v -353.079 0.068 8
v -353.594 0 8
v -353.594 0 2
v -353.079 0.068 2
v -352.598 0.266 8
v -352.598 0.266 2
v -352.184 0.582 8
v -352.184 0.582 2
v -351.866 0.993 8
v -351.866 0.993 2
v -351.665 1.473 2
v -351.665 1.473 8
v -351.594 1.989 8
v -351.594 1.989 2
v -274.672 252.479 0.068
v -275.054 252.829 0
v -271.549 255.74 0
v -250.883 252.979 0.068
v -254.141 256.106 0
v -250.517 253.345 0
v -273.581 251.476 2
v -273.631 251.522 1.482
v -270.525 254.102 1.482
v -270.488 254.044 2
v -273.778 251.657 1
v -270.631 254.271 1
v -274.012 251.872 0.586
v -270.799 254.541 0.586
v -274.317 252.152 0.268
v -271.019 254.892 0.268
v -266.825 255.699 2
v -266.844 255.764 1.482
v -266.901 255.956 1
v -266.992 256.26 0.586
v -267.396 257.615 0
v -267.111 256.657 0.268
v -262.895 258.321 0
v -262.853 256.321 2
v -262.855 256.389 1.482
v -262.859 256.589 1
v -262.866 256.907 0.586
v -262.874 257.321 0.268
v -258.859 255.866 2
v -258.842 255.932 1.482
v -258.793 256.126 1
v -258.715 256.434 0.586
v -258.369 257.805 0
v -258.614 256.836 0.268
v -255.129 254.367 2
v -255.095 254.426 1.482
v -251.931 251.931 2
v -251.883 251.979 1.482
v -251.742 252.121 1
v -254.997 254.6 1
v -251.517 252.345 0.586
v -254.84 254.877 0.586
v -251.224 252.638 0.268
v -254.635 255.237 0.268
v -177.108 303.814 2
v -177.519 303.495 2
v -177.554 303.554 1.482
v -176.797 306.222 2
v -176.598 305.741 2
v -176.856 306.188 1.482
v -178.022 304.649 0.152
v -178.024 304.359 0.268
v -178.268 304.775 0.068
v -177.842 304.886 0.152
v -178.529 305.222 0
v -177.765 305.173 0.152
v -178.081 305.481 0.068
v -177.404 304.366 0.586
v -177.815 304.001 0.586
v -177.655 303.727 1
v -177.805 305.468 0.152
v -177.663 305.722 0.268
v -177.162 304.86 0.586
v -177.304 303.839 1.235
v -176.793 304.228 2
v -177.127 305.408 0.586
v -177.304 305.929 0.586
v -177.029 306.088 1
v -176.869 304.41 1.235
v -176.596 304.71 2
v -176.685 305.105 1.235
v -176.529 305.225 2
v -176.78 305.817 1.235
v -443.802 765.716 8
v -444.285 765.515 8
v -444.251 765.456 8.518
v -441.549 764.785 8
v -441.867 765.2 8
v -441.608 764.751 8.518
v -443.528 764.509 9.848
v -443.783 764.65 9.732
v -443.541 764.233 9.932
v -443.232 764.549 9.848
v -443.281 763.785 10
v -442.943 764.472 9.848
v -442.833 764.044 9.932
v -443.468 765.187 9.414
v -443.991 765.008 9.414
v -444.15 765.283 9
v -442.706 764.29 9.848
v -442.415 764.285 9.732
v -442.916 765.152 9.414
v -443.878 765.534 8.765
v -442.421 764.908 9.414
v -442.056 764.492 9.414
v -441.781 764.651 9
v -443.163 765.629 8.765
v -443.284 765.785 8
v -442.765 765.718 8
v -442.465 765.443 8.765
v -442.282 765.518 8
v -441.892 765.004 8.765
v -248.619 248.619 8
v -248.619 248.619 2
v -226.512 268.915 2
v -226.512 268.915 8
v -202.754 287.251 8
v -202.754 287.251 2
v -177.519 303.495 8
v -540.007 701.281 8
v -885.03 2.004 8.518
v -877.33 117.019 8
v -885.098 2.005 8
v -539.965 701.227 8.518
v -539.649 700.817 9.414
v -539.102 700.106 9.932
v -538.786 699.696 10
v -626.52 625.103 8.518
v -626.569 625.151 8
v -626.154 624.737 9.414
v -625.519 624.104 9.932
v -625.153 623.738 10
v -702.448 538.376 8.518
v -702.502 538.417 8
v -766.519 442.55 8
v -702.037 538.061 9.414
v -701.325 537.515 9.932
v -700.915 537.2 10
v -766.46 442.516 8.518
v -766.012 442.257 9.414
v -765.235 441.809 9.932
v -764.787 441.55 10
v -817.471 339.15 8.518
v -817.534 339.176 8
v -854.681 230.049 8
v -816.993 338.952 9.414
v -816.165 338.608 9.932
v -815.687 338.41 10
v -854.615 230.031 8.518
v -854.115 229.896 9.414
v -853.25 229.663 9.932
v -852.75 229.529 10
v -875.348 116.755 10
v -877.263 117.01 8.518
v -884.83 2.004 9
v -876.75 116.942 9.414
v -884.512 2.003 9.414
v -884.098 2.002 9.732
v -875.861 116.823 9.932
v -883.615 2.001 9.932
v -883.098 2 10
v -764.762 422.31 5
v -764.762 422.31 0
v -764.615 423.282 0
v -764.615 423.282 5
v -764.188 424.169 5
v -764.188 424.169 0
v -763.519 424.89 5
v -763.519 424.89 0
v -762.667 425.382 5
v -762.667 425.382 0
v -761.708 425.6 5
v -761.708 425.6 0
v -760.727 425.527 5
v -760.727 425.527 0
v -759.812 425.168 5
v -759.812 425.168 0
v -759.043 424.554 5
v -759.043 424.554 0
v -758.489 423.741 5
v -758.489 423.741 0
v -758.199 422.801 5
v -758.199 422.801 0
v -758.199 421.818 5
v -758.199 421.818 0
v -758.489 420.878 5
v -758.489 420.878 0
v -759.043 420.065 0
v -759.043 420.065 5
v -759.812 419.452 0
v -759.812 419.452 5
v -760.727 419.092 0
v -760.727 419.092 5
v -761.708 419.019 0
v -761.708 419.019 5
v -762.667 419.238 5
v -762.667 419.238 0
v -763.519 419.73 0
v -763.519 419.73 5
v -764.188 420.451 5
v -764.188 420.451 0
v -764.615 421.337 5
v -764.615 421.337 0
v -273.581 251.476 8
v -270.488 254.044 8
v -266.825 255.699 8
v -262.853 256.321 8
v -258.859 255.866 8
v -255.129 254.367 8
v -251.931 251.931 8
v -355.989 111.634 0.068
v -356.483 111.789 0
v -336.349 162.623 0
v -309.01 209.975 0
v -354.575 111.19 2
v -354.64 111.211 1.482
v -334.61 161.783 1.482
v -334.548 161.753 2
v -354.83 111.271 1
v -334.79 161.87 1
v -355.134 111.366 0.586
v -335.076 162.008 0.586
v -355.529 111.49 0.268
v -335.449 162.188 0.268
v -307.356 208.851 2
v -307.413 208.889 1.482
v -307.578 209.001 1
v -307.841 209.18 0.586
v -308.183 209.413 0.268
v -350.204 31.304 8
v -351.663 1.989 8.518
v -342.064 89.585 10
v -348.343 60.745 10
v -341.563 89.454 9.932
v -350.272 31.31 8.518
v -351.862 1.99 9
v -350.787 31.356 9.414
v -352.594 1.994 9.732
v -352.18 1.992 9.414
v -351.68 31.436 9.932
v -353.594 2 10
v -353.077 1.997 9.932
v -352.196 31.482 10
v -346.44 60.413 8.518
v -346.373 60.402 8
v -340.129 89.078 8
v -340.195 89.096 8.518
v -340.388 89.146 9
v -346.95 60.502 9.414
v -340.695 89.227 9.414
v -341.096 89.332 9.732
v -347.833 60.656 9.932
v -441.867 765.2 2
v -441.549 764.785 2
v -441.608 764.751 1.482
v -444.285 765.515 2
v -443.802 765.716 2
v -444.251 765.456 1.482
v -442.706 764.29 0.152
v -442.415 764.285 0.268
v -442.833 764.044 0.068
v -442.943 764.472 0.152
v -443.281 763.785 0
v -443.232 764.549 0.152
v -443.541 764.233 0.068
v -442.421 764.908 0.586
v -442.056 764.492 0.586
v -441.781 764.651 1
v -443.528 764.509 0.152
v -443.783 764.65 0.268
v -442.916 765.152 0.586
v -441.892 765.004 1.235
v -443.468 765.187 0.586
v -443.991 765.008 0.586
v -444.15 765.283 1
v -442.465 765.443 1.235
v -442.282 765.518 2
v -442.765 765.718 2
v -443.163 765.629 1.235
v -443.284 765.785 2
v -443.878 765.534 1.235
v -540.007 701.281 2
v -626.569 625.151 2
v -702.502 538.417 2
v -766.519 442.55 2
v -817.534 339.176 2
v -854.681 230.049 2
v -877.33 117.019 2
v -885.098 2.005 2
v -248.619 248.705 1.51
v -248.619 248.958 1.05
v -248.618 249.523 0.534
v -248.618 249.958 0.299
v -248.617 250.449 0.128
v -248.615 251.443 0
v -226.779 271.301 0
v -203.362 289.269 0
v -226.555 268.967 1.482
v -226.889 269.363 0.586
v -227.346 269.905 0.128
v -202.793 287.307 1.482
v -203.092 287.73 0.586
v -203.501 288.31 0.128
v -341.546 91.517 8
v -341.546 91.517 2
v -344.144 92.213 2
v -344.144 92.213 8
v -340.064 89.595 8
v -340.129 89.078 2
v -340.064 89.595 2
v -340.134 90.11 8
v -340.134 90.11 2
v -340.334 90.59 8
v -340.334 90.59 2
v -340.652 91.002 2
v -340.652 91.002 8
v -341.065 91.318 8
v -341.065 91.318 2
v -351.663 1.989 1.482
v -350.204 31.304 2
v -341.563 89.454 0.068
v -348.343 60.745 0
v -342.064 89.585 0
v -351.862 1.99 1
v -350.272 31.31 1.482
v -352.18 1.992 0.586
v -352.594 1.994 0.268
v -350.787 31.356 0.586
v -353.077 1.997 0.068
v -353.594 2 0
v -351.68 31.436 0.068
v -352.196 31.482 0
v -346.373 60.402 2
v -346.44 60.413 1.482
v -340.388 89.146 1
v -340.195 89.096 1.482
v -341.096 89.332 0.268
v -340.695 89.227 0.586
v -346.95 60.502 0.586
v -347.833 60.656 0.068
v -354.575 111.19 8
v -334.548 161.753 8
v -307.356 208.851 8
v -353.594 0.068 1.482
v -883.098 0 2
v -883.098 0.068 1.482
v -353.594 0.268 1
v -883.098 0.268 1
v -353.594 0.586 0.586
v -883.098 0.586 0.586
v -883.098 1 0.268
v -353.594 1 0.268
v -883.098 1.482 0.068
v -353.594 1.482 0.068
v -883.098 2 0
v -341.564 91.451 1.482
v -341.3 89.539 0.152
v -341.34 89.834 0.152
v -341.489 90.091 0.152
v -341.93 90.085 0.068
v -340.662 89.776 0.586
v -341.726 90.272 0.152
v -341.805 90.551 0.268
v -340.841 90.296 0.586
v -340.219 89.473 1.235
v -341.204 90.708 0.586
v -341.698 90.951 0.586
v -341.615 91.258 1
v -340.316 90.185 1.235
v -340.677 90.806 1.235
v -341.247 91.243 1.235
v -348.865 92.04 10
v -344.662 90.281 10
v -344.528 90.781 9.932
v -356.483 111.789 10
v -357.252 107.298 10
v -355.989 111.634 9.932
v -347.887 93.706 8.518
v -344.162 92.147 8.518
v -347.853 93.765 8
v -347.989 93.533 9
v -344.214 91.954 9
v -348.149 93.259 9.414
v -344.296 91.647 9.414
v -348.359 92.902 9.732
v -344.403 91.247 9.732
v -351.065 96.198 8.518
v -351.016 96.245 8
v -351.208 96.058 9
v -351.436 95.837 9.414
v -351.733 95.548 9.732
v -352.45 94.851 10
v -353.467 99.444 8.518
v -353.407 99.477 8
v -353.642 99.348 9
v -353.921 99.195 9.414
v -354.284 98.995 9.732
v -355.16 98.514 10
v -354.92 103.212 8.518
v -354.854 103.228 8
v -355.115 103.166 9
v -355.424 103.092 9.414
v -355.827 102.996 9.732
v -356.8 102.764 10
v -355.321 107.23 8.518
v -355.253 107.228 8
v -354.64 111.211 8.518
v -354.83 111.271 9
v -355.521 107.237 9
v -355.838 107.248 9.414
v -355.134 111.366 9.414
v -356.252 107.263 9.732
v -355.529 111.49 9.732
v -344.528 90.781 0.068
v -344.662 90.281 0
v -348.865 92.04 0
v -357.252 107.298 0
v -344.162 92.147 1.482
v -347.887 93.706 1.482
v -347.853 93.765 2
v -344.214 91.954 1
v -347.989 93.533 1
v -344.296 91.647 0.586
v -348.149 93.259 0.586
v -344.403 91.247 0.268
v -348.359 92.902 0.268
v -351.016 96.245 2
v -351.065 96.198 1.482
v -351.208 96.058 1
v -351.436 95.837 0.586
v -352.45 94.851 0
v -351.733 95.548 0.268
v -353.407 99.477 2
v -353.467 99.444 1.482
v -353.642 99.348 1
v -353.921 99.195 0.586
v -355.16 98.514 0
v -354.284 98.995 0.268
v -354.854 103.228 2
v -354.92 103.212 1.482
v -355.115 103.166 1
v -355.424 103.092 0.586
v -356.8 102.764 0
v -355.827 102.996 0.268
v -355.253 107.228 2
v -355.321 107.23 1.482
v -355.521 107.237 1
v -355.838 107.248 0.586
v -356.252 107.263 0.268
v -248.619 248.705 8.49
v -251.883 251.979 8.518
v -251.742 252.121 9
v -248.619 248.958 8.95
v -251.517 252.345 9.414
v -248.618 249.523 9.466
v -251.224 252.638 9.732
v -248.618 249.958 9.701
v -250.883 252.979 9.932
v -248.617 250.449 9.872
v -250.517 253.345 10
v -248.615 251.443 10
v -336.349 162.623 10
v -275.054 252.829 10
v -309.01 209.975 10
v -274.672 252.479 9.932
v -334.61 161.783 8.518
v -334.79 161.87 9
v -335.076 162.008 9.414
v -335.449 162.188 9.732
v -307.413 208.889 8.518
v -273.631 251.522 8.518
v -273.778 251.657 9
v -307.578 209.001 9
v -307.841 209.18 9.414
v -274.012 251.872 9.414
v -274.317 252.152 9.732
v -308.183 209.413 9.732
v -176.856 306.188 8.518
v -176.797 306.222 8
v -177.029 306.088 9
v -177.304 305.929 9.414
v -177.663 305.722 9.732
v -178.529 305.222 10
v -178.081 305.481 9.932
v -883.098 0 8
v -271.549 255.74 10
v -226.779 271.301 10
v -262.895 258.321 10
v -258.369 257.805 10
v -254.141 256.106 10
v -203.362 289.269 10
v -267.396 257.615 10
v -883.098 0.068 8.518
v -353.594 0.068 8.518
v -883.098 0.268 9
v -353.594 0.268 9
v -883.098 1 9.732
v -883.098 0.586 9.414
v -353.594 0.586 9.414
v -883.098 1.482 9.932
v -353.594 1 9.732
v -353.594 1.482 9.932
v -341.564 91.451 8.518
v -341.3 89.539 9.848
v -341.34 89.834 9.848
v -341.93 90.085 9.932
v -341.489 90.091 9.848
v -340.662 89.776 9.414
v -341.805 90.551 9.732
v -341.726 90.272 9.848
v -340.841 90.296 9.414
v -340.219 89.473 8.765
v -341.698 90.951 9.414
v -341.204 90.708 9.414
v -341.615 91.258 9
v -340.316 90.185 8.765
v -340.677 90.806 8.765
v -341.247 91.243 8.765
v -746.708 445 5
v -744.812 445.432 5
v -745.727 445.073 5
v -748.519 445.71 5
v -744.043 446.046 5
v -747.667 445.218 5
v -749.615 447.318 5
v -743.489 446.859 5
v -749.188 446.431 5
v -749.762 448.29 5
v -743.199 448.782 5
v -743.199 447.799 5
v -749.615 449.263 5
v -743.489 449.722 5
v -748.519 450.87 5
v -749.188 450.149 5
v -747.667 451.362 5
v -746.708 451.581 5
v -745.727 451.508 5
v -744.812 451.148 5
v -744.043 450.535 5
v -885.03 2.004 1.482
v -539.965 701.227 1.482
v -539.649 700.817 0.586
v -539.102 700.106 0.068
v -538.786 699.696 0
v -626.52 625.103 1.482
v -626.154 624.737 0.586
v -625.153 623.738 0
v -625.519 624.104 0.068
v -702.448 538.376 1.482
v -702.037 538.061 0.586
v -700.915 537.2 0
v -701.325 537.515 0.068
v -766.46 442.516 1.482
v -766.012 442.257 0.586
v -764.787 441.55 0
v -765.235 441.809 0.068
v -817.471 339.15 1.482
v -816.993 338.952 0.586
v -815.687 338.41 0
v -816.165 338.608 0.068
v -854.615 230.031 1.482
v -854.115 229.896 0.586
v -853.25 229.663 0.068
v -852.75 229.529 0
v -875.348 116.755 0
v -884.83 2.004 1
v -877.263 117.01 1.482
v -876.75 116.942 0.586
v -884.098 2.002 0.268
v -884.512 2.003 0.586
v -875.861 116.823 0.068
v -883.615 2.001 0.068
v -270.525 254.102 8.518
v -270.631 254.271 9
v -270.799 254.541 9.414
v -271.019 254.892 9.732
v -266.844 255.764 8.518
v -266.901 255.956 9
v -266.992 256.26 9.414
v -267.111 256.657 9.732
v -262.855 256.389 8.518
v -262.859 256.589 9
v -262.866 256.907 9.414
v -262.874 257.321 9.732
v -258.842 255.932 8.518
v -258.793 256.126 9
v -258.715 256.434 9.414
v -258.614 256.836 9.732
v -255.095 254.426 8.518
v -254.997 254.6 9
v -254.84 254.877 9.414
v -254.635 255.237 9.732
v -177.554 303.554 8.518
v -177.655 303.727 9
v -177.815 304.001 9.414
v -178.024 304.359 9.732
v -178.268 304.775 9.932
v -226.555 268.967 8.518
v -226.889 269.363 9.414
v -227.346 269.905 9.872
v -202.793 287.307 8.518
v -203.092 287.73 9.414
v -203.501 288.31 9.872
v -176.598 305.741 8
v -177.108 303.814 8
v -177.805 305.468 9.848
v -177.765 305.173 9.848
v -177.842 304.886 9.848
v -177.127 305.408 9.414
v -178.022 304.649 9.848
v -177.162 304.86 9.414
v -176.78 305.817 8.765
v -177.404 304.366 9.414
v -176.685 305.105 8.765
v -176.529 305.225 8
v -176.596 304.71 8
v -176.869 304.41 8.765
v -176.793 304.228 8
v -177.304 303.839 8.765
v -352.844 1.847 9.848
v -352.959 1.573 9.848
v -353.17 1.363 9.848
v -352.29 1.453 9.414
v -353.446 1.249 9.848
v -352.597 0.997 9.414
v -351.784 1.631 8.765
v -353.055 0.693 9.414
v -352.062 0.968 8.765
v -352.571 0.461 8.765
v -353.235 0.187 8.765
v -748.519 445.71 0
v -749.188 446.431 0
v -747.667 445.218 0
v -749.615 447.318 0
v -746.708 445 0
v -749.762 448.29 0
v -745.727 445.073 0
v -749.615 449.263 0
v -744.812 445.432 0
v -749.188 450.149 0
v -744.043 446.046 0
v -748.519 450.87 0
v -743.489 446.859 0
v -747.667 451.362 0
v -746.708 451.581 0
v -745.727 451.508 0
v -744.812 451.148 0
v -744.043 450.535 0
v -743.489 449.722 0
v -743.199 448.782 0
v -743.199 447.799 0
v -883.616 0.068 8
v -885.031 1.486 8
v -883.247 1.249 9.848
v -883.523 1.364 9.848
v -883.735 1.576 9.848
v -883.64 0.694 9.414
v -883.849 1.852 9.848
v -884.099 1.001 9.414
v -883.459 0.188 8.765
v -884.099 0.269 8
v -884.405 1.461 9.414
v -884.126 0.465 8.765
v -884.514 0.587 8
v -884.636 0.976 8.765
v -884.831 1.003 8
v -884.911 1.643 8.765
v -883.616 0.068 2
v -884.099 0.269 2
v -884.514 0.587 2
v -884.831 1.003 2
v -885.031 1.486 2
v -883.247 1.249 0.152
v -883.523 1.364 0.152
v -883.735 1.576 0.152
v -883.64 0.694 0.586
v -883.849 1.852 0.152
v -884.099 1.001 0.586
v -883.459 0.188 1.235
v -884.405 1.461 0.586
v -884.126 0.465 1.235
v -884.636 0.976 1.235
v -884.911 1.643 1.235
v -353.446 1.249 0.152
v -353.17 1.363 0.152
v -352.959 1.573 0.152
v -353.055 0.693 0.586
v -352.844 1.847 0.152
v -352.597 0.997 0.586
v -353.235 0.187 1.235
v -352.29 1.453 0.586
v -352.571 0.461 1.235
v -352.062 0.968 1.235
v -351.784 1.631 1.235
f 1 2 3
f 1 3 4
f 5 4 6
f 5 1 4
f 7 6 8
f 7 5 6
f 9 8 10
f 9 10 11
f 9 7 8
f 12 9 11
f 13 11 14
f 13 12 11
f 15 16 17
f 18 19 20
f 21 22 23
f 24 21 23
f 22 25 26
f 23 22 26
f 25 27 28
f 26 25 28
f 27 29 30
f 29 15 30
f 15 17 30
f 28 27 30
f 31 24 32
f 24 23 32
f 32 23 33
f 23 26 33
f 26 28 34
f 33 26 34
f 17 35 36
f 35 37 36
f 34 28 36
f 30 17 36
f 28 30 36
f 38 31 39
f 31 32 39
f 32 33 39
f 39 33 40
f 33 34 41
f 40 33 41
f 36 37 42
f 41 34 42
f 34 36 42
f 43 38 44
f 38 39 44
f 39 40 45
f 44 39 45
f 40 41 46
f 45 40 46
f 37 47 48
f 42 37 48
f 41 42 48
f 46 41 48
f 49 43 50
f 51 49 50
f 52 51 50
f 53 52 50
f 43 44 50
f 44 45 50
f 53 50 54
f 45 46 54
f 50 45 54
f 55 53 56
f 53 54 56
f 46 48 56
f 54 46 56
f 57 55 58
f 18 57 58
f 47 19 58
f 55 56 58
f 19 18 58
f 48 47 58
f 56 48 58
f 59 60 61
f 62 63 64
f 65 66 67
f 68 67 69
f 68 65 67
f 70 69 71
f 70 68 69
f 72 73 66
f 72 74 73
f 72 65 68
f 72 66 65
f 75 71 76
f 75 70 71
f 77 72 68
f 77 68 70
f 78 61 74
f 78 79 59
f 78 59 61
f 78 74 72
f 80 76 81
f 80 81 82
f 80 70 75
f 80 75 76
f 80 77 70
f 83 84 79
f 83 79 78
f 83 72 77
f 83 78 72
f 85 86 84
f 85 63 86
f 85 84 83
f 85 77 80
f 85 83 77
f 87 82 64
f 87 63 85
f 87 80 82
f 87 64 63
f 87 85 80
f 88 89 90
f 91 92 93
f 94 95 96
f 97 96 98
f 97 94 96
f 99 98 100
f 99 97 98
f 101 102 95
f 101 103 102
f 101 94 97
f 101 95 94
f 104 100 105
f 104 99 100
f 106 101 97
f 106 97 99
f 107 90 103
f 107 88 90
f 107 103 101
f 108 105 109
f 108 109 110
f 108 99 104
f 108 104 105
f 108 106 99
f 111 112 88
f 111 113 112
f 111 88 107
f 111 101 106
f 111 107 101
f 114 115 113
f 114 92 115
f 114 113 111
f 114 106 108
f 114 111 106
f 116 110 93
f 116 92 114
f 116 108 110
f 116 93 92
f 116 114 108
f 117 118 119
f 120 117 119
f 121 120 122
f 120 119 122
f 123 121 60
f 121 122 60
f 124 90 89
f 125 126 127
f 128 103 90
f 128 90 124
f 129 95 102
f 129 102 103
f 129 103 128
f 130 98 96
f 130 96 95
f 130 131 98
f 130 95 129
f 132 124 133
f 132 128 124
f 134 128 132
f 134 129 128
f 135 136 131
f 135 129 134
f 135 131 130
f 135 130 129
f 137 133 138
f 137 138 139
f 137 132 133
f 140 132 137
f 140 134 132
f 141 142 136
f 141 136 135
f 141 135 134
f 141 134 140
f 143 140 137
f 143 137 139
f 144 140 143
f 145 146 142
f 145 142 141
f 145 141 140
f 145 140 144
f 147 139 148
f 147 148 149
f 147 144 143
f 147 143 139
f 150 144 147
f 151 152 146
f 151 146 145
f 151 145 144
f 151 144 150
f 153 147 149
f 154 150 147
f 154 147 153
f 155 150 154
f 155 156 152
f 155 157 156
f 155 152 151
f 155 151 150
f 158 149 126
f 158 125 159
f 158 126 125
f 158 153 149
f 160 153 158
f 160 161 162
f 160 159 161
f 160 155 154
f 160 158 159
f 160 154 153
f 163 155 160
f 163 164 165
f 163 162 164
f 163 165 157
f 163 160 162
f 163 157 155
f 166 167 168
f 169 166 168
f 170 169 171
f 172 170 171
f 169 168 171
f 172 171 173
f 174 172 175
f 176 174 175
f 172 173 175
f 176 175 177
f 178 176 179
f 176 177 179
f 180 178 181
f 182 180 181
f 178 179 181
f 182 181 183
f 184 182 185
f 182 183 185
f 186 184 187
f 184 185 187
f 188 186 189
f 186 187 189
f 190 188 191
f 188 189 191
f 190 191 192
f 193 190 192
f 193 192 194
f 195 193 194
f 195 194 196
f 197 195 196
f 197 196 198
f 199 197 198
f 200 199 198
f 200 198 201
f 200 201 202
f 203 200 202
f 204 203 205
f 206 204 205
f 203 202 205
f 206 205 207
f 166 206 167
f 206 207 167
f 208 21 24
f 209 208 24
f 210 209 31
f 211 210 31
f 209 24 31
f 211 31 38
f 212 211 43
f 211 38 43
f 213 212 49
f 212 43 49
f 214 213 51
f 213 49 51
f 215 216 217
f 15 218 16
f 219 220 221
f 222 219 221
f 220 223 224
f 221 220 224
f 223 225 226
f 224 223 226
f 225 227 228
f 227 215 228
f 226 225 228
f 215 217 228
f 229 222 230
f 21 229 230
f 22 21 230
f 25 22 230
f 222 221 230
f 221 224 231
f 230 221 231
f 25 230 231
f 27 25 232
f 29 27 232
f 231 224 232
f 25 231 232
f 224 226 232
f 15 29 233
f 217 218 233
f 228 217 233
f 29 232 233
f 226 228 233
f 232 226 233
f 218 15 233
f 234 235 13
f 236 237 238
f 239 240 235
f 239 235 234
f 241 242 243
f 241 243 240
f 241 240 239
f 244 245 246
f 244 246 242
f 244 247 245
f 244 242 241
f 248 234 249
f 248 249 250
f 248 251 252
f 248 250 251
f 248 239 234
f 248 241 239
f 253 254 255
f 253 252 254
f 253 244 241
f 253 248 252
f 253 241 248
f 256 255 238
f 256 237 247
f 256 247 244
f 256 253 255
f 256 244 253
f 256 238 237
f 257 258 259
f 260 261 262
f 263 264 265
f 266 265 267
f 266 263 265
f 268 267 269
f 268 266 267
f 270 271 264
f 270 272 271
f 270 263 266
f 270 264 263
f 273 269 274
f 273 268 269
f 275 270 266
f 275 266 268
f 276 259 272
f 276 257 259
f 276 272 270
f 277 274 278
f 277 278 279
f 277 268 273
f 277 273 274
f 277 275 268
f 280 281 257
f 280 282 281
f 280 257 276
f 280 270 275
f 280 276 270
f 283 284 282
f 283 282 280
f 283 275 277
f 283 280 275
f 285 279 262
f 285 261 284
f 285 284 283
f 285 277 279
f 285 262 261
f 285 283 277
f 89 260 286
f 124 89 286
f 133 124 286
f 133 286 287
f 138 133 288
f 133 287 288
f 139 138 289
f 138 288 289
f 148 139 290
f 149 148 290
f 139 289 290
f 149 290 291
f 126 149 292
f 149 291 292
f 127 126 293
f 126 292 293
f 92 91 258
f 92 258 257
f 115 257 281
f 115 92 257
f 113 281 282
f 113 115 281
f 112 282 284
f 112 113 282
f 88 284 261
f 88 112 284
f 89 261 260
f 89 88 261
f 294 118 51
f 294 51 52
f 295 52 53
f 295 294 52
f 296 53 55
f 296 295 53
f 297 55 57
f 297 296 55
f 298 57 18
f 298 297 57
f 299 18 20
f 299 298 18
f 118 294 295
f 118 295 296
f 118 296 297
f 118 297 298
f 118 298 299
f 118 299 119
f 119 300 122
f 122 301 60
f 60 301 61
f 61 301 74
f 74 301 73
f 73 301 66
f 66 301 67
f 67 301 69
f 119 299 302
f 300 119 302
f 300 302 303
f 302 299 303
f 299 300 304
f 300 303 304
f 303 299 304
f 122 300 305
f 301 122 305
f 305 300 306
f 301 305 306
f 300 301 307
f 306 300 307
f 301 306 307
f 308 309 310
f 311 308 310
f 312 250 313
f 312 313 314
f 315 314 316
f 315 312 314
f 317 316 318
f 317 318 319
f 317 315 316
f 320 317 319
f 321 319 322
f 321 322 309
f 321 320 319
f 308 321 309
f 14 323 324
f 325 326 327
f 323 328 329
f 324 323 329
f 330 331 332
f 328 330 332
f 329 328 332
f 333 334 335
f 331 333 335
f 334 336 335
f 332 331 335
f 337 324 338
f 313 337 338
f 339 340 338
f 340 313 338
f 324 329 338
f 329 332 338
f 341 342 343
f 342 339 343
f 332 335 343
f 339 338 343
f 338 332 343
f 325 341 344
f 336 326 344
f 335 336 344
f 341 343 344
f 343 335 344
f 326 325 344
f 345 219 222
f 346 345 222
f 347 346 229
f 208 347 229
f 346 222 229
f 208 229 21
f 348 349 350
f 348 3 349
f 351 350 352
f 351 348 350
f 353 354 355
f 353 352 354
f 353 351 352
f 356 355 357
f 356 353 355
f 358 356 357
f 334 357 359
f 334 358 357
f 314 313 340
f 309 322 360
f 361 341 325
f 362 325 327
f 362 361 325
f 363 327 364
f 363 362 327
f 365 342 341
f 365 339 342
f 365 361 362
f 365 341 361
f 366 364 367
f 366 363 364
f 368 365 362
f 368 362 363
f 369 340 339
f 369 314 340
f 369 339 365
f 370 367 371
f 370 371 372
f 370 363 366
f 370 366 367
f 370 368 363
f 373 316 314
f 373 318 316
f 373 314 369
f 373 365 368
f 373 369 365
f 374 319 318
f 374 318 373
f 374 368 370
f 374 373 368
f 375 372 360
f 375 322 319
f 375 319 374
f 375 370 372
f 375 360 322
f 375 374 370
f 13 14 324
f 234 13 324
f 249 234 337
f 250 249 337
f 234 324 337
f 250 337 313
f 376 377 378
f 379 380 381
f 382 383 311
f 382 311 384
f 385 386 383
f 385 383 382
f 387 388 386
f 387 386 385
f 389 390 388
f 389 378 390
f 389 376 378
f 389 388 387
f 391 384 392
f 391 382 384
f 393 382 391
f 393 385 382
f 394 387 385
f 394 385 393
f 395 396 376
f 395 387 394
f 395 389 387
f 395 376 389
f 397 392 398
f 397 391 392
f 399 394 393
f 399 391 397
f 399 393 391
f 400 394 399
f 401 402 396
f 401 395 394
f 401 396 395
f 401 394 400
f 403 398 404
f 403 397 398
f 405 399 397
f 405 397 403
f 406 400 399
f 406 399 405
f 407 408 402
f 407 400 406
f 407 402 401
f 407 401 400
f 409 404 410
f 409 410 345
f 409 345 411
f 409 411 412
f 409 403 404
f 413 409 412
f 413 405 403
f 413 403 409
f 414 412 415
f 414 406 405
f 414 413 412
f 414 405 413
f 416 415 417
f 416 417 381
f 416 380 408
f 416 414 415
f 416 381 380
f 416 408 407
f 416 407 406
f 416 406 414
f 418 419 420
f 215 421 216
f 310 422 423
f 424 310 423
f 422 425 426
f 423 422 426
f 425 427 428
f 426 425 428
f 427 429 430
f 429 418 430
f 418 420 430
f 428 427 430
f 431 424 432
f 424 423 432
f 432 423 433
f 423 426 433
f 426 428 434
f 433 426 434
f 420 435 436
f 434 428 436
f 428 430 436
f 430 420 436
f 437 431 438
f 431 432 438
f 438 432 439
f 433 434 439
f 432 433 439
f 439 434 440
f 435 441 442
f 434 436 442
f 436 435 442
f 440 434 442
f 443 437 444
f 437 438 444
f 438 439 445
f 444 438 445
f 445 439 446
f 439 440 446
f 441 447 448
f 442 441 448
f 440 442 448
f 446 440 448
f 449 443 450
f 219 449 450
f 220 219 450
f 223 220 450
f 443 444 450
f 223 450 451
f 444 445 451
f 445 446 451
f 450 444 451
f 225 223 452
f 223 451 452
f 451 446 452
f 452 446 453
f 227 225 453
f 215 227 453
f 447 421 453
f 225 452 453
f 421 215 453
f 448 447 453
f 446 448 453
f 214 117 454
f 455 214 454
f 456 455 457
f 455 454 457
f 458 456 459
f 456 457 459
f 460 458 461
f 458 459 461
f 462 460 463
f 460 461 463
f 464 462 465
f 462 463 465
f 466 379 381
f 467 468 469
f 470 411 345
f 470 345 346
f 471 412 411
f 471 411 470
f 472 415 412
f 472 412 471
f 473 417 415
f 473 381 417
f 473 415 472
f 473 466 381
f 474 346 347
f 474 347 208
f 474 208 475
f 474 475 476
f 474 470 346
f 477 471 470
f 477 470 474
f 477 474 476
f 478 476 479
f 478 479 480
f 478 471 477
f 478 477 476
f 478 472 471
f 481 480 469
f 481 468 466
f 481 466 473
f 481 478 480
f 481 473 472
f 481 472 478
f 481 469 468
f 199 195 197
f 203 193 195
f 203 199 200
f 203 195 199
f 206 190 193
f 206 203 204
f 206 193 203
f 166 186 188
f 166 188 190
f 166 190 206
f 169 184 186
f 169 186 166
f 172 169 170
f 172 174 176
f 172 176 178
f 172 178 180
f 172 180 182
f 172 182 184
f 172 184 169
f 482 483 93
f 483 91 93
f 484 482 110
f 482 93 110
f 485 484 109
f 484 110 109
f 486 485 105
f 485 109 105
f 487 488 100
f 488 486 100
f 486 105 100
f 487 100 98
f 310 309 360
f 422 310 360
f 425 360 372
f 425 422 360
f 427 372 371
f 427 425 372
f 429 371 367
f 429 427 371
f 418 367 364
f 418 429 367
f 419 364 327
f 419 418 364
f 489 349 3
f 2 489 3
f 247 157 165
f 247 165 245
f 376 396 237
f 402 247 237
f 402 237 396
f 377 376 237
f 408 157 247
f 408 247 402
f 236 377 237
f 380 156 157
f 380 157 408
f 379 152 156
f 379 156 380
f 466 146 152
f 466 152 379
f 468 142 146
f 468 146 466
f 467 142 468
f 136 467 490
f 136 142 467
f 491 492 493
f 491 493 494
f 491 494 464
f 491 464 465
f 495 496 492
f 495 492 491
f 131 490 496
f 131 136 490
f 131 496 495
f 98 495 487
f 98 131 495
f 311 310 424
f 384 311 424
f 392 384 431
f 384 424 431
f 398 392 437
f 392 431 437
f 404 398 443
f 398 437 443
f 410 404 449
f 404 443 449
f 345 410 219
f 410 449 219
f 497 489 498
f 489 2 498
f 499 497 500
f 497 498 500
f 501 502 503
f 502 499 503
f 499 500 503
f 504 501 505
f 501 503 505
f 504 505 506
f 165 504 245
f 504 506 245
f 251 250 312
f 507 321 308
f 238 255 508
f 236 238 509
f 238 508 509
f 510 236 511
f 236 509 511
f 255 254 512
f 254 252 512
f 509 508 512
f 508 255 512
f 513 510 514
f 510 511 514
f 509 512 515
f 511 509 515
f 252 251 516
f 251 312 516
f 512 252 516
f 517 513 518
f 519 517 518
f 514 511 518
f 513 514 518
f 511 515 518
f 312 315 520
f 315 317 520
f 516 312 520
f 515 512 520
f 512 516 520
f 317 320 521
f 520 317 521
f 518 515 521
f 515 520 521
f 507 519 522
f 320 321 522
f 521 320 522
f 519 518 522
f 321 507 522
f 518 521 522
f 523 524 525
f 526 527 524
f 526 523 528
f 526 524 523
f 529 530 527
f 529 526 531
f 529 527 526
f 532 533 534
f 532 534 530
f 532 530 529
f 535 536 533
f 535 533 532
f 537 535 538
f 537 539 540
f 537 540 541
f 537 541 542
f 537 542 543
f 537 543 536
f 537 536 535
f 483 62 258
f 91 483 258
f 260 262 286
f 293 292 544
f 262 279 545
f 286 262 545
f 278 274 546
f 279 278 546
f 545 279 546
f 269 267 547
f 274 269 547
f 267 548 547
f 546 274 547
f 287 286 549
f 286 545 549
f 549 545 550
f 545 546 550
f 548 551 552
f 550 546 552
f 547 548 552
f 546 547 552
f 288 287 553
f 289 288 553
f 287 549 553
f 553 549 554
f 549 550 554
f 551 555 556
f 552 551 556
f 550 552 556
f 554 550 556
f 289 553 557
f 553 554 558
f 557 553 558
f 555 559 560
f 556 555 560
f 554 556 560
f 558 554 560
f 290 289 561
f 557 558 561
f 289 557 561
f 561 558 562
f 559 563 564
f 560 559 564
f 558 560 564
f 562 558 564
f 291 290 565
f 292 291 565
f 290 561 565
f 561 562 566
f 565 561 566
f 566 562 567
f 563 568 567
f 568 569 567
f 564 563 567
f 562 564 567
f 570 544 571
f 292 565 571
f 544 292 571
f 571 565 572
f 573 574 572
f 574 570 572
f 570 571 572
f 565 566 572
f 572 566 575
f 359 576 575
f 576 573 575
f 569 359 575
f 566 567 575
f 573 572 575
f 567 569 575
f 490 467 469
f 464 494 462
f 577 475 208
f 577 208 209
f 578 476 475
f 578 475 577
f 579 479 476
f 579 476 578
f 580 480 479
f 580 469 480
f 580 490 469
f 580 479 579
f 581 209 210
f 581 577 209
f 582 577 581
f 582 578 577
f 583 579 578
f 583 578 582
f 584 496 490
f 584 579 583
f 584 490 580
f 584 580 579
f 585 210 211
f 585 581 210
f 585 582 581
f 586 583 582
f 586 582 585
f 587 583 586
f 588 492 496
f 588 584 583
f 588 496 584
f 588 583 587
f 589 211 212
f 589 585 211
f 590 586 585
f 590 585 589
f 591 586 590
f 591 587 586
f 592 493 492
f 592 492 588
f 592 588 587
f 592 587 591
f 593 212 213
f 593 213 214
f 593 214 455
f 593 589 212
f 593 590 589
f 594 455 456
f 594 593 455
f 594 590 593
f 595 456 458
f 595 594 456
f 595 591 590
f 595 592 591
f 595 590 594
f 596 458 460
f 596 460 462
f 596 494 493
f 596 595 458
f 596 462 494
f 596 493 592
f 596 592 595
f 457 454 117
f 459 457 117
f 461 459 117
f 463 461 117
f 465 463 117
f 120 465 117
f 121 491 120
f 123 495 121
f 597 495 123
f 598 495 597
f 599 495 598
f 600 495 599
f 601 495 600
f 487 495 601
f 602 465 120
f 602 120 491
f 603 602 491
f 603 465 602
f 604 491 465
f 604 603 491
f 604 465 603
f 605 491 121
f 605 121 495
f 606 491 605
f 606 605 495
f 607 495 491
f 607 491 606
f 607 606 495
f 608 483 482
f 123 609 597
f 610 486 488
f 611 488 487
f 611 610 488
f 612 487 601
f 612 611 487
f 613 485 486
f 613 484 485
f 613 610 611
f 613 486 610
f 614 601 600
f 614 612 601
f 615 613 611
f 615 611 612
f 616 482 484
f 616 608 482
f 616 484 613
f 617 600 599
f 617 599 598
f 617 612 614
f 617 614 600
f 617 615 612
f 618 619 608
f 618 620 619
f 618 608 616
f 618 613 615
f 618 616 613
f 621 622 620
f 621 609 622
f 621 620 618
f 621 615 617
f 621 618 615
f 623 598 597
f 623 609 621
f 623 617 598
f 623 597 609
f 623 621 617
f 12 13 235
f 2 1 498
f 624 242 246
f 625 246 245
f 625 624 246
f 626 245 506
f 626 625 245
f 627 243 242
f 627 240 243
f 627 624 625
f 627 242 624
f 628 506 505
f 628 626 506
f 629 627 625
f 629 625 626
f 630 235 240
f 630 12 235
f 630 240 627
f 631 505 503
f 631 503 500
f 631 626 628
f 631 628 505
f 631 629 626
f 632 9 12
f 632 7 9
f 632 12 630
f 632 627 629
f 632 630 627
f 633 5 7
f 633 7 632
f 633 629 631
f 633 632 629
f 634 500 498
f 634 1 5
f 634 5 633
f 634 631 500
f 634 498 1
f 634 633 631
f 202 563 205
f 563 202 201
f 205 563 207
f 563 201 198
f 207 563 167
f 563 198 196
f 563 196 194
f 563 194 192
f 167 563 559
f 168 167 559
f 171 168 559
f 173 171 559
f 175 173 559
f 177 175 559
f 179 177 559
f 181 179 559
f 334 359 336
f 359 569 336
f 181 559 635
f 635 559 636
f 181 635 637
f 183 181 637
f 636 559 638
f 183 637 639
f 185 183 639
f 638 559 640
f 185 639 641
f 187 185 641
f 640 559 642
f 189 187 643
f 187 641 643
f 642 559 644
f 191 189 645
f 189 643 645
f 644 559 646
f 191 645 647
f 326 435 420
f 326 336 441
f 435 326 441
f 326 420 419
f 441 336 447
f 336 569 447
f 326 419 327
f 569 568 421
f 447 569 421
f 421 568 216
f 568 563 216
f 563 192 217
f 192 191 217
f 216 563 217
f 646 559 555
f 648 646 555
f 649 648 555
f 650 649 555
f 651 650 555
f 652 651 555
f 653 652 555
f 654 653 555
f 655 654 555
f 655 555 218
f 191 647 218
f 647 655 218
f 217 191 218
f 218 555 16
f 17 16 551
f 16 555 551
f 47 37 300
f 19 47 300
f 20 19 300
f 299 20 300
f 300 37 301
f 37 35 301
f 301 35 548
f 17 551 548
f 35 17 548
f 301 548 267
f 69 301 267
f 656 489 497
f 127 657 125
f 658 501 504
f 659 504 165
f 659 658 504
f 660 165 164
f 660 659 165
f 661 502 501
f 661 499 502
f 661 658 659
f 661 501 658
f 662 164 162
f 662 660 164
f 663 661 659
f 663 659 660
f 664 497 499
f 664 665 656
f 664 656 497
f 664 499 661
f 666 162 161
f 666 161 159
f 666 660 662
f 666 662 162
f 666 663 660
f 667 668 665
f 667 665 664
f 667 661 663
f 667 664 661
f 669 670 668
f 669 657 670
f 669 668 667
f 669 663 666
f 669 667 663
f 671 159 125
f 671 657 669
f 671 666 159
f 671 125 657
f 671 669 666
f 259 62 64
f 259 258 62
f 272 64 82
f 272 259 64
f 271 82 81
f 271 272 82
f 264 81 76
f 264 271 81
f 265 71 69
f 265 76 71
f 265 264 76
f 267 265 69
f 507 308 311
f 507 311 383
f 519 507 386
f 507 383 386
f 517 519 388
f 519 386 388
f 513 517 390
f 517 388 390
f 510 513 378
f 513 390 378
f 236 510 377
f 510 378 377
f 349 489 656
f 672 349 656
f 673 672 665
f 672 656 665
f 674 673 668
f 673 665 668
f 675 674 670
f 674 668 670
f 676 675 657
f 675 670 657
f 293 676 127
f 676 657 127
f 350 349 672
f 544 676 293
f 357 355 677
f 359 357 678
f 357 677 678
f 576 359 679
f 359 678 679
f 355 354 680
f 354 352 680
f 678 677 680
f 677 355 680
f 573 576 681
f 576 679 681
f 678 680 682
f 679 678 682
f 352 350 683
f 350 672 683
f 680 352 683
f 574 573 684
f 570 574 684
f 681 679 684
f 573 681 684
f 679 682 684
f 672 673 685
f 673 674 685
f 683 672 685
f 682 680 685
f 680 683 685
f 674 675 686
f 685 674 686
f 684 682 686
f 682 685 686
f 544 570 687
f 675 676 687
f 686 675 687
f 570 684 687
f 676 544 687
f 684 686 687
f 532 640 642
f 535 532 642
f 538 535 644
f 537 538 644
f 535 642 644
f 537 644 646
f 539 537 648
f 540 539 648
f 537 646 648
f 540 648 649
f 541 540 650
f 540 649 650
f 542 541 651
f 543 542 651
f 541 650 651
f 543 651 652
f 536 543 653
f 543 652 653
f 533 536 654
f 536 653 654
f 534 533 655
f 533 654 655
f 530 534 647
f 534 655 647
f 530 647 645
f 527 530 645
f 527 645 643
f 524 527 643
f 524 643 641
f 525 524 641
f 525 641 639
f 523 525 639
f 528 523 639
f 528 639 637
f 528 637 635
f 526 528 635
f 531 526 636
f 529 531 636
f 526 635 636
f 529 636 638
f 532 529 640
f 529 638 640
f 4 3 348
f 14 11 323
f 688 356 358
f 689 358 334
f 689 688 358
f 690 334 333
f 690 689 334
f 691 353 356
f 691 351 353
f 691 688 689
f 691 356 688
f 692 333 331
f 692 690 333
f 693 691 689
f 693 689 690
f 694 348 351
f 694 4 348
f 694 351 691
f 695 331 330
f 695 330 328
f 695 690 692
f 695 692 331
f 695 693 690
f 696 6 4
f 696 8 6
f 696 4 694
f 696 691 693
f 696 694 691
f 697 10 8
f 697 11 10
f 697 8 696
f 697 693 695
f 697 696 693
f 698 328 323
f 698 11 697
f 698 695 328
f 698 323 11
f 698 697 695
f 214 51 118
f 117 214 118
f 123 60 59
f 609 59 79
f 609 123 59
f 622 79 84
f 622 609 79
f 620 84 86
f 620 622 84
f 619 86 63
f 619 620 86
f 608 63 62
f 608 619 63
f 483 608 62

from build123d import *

# Parameters (mm, degrees)
BOSS_EXTRUDE1_DEPTH = 10
FILLET2_R           = 2
SKETCH2_R           = 3.3
CUT_EXTRUDE1_DEPTH  = 5


with BuildPart() as part:
    # Sketch1 → Boss-Extrude1 (new body)
    with BuildSketch(Plane.XY):
        with BuildLine():
            Line((-885.1, 0), (-351.6, 0))
            ThreePointArc((-351.6, 0), (-348.592013259, 45.893009185), (-339.619520523, 91.000776258))
            Line((-339.619520523, 91.000776258), (-344.144284915, 92.213183223))
            ThreePointArc((-344.144284915, 92.213183223), (-353.407280278, 99.477004084), (-354.574758601, 111.190379813))
            ThreePointArc((-354.574758601, 111.190379813), (-321.815040046, 185.8), (-273.581072875, 251.475558583))
            ThreePointArc((-273.581072875, 251.475558583), (-262.853252768, 256.321180561), (-251.931101693, 251.931101693))
            Line((-251.931101693, 251.931101693), (-248.618744265, 248.618744265))
            ThreePointArc((-248.618744265, 248.618744265), (-214.040518439, 278.943034446), (-175.8, 304.494531971))
            Line((-175.8, 304.494531971), (-442.55, 766.51908489))
            ThreePointArc((-442.55, 766.51908489), (-766.51908489, 442.55), (-885.1, 0))
        make_face()
    extrude(amount=BOSS_EXTRUDE1_DEPTH)

    # Fillet2
    fillet2_edges = [part.edges().sort_by_distance(p)[0] for p in [
        (-618.35, 0, 0),
        (-348.592013259, 45.893009185, 0),
        (-341.881902719, 91.60697974, 0),
        (-353.407280278, 99.477004084, 0),
        (-321.815040046, 185.8, 0),
        (-262.853252768, 256.321180561, 0),
        (-250.274922979, 250.274922979, 0),
        (-214.040518439, 278.943034446, 10),
        (-214.040518439, 278.943034446, 0),
        (-309.175, 535.50680843, 0),
        (-766.51908489, 442.55, 0),
        (-250.274922979, 250.274922979, 10),
        (-885.1, 0, 5),
        (-351.6, 0, 5),
        (-339.619520523, 91.000776258, 5),
        (-175.8, 304.494531971, 5),
        (-442.55, 766.51908489, 5),
        (-262.853252768, 256.321180561, 10),
        (-321.815040046, 185.8, 10),
        (-353.407280278, 99.477004084, 10),
        (-341.881902719, 91.60697974, 10),
        (-348.592013259, 45.893009185, 10),
        (-618.35, 0, 10),
        (-766.51908489, 442.55, 10),
        (-309.175, 535.50680843, 10),
    ]]
    fillet(fillet2_edges, radius=FILLET2_R)

    # Sketch2 → Cut-Extrude1 (cut)
    with BuildSketch(Plane(origin=(0, 0, 0), x_dir=(-1, 0, 0), z_dir=(0, 0, -1))):
        with Locations((746.461716535, 448.290381057)):
            Circle(SKETCH2_R)
        with Locations((761.461716535, 422.309618943)):
            Circle(SKETCH2_R)
    extrude(amount=-CUT_EXTRUDE1_DEPTH, mode=Mode.SUBTRACT)


solid = part.part
